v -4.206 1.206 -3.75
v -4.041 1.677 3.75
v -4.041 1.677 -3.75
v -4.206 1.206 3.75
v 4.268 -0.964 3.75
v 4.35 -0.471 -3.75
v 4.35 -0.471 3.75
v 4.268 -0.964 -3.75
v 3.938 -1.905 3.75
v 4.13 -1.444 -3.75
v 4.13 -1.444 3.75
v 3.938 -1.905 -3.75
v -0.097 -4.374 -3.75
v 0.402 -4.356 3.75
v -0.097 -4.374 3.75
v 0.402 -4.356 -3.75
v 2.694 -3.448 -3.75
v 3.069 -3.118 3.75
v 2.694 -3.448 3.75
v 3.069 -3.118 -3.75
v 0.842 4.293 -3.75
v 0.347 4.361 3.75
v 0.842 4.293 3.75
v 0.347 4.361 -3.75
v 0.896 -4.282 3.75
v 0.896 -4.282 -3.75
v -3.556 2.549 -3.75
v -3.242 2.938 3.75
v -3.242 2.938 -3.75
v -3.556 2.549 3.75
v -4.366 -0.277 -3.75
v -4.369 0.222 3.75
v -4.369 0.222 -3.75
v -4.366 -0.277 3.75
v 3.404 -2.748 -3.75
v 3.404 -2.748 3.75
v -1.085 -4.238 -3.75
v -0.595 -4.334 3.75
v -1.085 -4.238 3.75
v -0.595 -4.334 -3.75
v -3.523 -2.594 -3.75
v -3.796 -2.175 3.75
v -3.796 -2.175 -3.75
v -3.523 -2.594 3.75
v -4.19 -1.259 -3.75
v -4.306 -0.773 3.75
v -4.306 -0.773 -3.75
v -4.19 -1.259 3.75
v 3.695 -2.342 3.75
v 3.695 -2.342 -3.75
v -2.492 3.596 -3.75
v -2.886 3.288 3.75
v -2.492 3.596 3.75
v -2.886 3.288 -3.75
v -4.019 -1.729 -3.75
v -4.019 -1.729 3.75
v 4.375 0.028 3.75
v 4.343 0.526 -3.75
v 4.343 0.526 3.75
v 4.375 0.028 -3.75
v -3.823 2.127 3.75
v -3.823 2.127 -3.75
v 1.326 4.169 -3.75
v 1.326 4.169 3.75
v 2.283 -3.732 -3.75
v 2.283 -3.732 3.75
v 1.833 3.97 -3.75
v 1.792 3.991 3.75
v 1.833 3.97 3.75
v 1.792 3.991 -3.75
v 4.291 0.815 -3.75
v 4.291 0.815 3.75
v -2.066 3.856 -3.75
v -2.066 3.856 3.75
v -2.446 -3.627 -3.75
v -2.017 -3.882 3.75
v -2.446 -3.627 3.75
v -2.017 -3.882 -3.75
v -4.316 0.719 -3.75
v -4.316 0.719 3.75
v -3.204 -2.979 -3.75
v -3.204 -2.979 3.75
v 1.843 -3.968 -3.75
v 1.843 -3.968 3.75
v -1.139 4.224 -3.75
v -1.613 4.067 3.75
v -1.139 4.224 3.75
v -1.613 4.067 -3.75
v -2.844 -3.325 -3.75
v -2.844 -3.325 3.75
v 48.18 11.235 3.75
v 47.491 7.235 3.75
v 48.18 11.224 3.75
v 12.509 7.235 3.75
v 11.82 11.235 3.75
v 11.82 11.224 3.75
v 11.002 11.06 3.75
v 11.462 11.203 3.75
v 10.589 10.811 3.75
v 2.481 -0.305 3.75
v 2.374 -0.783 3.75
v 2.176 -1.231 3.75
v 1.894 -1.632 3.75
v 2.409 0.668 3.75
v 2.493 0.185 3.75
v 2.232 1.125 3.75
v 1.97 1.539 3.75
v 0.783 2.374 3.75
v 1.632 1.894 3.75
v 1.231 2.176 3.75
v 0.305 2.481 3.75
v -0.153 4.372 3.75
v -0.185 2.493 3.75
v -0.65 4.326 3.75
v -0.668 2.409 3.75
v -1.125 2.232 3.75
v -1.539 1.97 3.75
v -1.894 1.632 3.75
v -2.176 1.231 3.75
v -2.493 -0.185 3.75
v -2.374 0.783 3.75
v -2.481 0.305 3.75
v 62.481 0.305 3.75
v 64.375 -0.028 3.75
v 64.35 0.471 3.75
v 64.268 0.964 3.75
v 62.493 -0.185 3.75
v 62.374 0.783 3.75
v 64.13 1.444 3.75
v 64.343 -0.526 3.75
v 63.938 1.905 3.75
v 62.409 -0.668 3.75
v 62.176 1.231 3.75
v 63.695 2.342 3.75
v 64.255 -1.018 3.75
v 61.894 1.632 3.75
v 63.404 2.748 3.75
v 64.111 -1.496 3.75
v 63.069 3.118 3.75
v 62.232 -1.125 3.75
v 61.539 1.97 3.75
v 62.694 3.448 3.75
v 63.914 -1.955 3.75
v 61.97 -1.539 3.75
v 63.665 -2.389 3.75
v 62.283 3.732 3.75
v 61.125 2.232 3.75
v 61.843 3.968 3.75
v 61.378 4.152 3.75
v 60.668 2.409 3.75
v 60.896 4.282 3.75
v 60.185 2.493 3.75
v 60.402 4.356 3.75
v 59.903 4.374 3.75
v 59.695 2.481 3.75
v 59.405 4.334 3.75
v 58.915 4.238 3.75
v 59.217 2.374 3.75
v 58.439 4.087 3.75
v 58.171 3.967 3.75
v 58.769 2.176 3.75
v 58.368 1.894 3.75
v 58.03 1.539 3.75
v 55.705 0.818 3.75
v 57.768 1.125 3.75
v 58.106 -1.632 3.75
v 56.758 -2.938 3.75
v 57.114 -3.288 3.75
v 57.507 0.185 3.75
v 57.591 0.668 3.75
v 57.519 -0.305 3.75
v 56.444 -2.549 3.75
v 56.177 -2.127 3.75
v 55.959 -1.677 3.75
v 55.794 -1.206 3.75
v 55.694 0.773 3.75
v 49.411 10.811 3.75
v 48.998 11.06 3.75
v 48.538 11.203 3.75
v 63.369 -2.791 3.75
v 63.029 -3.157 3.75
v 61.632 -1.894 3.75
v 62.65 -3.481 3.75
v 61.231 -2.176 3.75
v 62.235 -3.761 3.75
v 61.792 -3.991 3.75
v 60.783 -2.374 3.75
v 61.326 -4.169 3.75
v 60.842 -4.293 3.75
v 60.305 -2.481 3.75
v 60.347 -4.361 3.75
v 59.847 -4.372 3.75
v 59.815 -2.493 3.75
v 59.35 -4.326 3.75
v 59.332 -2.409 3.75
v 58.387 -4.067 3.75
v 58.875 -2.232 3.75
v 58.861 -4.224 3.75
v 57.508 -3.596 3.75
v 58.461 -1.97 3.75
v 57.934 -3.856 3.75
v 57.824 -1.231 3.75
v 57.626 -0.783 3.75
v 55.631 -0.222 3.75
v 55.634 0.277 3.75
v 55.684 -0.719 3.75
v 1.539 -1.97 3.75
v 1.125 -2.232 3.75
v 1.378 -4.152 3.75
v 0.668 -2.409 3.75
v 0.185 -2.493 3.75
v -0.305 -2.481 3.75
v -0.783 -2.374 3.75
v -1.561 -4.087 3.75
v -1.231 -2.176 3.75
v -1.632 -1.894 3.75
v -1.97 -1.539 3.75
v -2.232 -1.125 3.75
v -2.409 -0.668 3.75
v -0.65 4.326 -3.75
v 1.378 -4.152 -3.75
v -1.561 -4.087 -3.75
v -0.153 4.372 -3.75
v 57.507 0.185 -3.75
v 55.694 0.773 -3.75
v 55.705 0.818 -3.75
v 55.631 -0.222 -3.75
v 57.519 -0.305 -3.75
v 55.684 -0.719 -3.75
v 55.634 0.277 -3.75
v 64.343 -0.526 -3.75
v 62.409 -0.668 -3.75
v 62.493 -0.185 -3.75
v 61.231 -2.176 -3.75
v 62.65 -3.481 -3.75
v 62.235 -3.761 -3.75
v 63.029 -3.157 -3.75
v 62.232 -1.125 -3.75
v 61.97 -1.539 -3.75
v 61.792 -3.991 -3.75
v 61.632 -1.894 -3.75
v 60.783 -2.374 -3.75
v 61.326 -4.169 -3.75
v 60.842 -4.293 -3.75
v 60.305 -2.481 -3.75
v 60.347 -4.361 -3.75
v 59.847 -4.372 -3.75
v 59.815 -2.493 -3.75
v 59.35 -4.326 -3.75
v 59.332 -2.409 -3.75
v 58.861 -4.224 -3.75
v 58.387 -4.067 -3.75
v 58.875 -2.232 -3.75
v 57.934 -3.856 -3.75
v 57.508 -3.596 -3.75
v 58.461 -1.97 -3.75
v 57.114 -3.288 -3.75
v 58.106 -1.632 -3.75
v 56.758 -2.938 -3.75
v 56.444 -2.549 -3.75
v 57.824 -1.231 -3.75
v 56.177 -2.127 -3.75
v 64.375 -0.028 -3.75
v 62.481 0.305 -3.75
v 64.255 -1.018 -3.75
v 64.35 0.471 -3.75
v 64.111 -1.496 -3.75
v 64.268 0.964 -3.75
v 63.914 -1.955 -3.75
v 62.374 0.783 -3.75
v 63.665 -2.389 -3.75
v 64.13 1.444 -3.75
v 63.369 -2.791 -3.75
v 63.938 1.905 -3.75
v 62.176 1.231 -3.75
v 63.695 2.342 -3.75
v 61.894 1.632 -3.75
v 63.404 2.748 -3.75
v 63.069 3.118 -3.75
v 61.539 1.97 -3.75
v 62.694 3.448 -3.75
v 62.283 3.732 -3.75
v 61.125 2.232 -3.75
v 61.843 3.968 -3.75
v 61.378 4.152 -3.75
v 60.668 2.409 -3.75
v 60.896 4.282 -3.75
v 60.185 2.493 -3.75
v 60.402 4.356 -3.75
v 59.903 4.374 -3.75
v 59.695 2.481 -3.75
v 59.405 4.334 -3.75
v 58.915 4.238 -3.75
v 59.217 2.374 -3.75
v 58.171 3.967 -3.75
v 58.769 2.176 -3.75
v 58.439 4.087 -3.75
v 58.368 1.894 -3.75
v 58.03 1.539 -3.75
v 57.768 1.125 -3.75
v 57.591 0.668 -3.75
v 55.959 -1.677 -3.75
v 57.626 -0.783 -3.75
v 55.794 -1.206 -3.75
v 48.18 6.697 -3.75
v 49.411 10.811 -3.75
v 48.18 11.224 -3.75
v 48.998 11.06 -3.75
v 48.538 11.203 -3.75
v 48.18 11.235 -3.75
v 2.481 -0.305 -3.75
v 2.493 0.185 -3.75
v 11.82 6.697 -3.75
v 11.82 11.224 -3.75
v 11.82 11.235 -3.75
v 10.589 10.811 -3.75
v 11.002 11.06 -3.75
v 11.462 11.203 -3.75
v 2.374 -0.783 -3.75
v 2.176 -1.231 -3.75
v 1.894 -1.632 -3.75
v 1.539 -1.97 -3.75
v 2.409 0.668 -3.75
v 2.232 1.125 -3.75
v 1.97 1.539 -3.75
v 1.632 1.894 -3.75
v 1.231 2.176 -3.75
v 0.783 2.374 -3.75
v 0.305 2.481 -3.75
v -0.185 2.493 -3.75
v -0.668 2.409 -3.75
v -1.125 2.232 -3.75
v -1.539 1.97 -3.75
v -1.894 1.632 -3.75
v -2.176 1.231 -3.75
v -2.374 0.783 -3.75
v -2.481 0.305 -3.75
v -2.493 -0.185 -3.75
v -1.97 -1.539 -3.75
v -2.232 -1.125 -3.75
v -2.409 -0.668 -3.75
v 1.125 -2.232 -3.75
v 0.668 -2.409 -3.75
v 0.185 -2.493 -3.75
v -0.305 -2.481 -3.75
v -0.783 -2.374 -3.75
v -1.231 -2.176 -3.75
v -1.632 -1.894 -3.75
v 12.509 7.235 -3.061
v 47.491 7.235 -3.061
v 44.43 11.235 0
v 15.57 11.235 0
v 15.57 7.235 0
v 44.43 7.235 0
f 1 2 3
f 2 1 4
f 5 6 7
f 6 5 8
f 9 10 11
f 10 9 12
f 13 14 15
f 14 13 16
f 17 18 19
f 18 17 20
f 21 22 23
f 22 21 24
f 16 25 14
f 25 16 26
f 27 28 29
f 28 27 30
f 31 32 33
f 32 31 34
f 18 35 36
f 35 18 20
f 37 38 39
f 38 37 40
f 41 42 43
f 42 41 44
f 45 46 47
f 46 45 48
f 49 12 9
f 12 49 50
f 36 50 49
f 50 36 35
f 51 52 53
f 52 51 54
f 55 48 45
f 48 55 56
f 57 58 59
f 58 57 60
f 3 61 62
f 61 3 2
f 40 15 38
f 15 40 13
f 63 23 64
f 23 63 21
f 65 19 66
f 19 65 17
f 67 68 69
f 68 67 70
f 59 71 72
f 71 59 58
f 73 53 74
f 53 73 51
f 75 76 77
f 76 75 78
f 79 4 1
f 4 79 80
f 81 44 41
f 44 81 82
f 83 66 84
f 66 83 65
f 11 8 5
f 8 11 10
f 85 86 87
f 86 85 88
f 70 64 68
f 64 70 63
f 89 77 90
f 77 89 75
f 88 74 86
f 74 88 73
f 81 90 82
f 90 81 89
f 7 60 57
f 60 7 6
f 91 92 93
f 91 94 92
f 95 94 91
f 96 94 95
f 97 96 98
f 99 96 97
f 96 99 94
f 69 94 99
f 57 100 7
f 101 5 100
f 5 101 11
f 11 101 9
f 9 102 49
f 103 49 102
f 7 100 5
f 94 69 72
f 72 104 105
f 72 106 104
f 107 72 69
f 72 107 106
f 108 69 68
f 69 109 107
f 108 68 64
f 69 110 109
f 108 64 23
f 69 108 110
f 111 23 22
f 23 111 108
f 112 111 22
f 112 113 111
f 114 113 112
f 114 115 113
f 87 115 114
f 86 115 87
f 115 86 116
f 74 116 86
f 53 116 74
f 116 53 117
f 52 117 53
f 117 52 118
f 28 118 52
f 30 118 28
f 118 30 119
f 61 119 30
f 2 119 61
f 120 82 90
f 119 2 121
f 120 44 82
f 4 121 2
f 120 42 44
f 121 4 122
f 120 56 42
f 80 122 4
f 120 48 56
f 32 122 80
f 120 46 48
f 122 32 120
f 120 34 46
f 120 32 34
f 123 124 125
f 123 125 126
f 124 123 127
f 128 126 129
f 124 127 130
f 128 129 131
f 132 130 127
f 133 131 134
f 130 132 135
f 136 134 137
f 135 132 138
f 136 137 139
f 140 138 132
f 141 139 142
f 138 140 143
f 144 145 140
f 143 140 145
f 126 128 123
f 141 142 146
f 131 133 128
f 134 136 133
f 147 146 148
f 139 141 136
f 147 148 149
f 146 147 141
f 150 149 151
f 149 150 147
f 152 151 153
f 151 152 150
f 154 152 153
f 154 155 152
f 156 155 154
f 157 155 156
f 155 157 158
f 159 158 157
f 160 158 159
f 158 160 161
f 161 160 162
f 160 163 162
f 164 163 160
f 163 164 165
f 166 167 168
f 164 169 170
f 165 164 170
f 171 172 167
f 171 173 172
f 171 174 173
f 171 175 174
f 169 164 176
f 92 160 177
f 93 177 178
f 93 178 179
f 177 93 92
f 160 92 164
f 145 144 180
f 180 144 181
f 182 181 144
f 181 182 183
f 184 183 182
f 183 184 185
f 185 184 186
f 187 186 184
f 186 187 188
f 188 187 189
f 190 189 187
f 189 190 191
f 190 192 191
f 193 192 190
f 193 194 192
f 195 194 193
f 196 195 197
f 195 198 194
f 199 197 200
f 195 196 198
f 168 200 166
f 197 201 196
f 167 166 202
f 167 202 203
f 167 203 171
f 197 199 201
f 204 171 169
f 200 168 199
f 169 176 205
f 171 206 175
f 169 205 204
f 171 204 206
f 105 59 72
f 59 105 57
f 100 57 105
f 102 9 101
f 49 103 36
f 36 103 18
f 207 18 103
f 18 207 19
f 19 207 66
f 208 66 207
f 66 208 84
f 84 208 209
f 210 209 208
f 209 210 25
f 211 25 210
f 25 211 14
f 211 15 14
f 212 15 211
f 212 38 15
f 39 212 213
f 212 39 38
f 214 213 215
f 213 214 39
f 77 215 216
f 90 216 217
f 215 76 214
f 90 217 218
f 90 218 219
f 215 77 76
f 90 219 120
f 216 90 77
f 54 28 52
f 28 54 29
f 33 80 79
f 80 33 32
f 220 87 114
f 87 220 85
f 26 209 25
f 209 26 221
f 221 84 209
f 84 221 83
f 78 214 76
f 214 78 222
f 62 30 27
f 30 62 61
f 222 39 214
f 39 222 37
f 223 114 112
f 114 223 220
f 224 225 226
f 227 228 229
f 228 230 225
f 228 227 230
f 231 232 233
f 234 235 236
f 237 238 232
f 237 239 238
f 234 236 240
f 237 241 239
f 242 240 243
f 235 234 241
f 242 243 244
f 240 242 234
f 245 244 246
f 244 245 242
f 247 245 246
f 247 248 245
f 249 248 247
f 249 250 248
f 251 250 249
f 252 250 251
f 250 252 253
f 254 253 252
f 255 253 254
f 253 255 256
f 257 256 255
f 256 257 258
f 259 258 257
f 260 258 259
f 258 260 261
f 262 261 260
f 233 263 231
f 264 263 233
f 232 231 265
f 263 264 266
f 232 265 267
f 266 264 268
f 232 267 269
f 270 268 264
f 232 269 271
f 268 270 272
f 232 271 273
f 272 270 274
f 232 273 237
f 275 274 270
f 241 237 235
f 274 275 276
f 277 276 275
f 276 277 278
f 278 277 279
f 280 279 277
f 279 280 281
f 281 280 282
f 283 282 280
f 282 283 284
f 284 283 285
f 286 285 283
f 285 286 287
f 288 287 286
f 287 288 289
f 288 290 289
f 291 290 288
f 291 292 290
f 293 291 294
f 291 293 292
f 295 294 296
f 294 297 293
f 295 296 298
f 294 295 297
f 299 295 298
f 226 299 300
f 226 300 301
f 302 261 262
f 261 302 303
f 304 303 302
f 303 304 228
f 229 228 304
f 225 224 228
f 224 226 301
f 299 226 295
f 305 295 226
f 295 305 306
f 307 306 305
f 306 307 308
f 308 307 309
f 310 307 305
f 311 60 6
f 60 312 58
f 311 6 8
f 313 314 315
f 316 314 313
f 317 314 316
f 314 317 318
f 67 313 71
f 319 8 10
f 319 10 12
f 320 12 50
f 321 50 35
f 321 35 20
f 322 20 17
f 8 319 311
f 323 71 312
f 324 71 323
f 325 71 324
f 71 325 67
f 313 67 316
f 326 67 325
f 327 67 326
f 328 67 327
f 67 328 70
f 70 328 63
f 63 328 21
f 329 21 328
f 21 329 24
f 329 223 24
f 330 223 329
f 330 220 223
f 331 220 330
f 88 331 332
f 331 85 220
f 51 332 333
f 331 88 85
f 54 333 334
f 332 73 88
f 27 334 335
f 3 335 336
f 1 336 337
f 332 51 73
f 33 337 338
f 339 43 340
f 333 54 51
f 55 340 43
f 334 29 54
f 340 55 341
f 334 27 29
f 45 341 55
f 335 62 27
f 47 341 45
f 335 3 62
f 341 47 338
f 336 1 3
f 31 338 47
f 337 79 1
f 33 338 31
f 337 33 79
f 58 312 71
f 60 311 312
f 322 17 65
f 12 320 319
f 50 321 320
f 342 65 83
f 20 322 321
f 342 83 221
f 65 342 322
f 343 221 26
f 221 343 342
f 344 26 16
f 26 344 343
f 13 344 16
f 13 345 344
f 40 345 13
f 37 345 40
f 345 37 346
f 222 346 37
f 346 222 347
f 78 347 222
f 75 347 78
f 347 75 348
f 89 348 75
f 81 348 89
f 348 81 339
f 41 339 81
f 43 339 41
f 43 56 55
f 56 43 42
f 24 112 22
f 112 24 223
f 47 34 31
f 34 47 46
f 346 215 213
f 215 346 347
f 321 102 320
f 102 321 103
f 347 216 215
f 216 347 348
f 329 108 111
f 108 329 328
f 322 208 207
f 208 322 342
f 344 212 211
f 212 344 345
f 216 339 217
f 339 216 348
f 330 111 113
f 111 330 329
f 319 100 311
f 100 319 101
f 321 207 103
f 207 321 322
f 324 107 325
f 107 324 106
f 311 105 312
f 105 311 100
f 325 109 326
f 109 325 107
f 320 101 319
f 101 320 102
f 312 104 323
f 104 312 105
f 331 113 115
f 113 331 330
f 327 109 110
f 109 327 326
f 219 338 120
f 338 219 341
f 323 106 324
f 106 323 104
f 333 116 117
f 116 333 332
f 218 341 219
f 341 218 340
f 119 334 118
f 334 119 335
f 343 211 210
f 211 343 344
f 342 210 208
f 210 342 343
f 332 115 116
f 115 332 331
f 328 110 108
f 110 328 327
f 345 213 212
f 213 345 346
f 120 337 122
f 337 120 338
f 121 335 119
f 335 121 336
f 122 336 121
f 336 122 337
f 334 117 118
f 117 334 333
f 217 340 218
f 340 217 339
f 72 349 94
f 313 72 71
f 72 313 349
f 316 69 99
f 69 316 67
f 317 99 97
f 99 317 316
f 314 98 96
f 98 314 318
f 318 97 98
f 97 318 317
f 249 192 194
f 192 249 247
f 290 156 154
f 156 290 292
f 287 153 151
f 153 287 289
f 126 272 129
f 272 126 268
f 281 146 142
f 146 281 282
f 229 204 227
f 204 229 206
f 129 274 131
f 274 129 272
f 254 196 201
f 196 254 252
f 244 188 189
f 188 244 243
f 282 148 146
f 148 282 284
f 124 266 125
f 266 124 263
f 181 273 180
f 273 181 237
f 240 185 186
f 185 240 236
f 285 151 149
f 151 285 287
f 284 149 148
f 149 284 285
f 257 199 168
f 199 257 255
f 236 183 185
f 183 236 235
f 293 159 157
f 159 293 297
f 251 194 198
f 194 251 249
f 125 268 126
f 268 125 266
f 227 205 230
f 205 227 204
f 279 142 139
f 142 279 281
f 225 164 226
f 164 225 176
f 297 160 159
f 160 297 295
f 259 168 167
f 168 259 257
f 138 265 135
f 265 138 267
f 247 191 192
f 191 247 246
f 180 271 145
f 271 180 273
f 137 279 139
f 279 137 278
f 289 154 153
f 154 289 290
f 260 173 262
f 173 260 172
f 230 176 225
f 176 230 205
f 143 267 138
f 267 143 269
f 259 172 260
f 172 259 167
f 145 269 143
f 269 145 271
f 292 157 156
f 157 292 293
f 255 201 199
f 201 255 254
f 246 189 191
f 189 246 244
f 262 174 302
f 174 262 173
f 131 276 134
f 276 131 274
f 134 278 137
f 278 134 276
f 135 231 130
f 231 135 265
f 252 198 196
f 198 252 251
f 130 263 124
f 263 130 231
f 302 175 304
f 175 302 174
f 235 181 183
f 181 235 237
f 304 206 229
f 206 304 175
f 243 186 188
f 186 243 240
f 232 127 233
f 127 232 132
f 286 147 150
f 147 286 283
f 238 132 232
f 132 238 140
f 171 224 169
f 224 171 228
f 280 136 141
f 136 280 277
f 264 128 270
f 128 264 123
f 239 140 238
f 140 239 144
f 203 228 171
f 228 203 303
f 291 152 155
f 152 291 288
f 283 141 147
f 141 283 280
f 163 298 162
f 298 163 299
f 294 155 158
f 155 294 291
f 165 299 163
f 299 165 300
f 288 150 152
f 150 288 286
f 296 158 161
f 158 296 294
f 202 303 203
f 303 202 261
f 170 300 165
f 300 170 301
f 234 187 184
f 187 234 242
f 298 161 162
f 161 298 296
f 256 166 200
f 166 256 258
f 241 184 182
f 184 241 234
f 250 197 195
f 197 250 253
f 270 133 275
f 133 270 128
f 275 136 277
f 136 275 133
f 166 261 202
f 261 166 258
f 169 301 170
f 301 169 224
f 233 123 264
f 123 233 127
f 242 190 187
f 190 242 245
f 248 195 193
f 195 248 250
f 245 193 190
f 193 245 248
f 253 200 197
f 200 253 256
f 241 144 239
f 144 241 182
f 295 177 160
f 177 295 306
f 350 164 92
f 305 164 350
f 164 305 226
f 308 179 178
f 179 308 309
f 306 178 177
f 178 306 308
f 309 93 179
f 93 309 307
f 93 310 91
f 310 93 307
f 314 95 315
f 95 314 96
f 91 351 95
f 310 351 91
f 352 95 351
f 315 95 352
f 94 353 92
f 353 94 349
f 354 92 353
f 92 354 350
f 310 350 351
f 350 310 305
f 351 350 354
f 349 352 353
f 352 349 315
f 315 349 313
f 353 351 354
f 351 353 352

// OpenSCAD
// file: bracket.scad
standoff_spacing = 60;
standoff_width = 5;
standoff_height = standoff_width * 1.5;

arm_angle = 38;
arm_length = 15;
arm_height = standoff_height;
arm_width = standoff_width / 5 * 4;

xt60_bracket_thickness = 1;

arm_deg = 90 - arm_angle;
bridge_length = standoff_spacing - (cos(arm_angle) * arm_length) * 2;

$fs = $preview ? 1 : 0.5;
$fa = $preview ? 10 : 5;

anti_warp = .15;
filament_width = 1.75;

function anti_warp_widen(v) = v + (filament_width * anti_warp) * 2;
function anti_warp_shrink(v) = v - (filament_width * anti_warp) * 2;

module joint(height, diameter) {
	assert(height > 0 && diameter > 0, "invalid args");
	cylinder(h = height, d = diameter, center = true);
}

module standoff_hole(height, diameter) {
	joint(height, diameter);
}


module standoff() {
	difference() {
		standoff_hole(standoff_height, standoff_width * 1.75);
		standoff_hole(standoff_height, standoff_width);
	}
}

module standoff_arm() {
	standoff();
	difference() {
		translate([0, arm_length / 2]) cube([arm_width, arm_length, arm_height], center = true);
		standoff_hole(standoff_height, standoff_width);
	}
	translate([0, arm_length]) joint(arm_height, arm_width);
}

module xt60_bracket(gen_claws = true) {
	xt60_height = anti_warp_widen(15);
	xt60_length = anti_warp_shrink(16);
	xt60_width = anti_warp_shrink(8);
	xt60_stub_width = 0.5;

	translate([-(xt60_bracket_thickness + xt60_length / 2), 0]) {
		cube([xt60_length + xt60_bracket_thickness * 2, xt60_bracket_thickness, xt60_height]);
		if (gen_claws) {
			 translate([0, -xt60_stub_width, -xt60_bracket_thickness]) cube([xt60_length + xt60_bracket_thickness * 2, xt60_stub_width + xt60_bracket_thickness, xt60_bracket_thickness]);
			 translate([0, -xt60_stub_width, -xt60_bracket_thickness + xt60_height]) cube([xt60_length + xt60_bracket_thickness * 2, xt60_stub_width + xt60_bracket_thickness, xt60_bracket_thickness]);
		}
	}

	translate([xt60_length / 2, -(xt60_width + xt60_bracket_thickness)]) {
		cube([xt60_bracket_thickness, xt60_width + xt60_bracket_thickness * 2, xt60_height]);
		if (gen_claws) {
			translate([-xt60_stub_width, 0, -xt60_bracket_thickness]) cube([xt60_stub_width + xt60_bracket_thickness, xt60_width + xt60_bracket_thickness * 2, xt60_bracket_thickness]);
			translate([-xt60_stub_width, 0, -xt60_bracket_thickness + xt60_height]) cube([xt60_stub_width + xt60_bracket_thickness, xt60_width + xt60_bracket_thickness * 2, xt60_bracket_thickness]);
		}
	}

	translate([-(xt60_length / 2 + xt60_bracket_thickness), -(xt60_width + xt60_bracket_thickness)]) {
		cube([xt60_bracket_thickness, xt60_width + xt60_bracket_thickness * 2, xt60_height]);
		if (gen_claws) {
			translate([0, 0, -xt60_bracket_thickness]) cube([xt60_stub_width + xt60_bracket_thickness, xt60_width + xt60_bracket_thickness * 2, xt60_bracket_thickness]);
			translate([0, 0, -xt60_bracket_thickness + xt60_height]) cube([xt60_stub_width + xt60_bracket_thickness, xt60_width + xt60_bracket_thickness * 2, xt60_bracket_thickness]);
		}
	}

	translate([-(xt60_length / 2 + xt60_bracket_thickness), -(xt60_width + xt60_bracket_thickness)]) {
		cube([xt60_length + xt60_bracket_thickness * 2, xt60_bracket_thickness, xt60_height]);
		if (gen_claws) {
			translate([0, 0, -xt60_bracket_thickness]) cube([xt60_length + xt60_bracket_thickness * 2, xt60_stub_width + xt60_bracket_thickness, xt60_bracket_thickness]);
			translate([0, 0, -xt60_bracket_thickness + xt60_height]) cube([xt60_length + xt60_bracket_thickness * 2, xt60_stub_width + xt60_bracket_thickness, xt60_bracket_thickness]);
		}
	}
}

module bridge() {
	translate([bridge_length / 2, 0]) cube([bridge_length, arm_width, arm_height], center = true);
}

module bracket() {
	rotate([0, 0, -arm_deg]) standoff_arm();
	translate([standoff_spacing, 0]) rotate([0, 0, arm_deg]) standoff_arm();
	translate([cos(arm_angle) * arm_length, sin(arm_angle) * arm_length]) bridge();
}
// main file
include <bracket.scad>

module usb_cutout() {
	rotate([90, 0]) linear_extrude(height = arm_width * 2, center = true) polygon([[-bridge_length / 2, 0], [bridge_length / 2, 0], [bridge_length / 2 - arm_length / 4, arm_height / 2], [-bridge_length / 2 + arm_length / 4, arm_height / 2]]);
}

difference() {
	bracket();
	translate([cos(arm_angle) * arm_length + bridge_length / 2,
		sin(arm_angle) * arm_length,
		-arm_height / 2]) usb_cutout();
}
